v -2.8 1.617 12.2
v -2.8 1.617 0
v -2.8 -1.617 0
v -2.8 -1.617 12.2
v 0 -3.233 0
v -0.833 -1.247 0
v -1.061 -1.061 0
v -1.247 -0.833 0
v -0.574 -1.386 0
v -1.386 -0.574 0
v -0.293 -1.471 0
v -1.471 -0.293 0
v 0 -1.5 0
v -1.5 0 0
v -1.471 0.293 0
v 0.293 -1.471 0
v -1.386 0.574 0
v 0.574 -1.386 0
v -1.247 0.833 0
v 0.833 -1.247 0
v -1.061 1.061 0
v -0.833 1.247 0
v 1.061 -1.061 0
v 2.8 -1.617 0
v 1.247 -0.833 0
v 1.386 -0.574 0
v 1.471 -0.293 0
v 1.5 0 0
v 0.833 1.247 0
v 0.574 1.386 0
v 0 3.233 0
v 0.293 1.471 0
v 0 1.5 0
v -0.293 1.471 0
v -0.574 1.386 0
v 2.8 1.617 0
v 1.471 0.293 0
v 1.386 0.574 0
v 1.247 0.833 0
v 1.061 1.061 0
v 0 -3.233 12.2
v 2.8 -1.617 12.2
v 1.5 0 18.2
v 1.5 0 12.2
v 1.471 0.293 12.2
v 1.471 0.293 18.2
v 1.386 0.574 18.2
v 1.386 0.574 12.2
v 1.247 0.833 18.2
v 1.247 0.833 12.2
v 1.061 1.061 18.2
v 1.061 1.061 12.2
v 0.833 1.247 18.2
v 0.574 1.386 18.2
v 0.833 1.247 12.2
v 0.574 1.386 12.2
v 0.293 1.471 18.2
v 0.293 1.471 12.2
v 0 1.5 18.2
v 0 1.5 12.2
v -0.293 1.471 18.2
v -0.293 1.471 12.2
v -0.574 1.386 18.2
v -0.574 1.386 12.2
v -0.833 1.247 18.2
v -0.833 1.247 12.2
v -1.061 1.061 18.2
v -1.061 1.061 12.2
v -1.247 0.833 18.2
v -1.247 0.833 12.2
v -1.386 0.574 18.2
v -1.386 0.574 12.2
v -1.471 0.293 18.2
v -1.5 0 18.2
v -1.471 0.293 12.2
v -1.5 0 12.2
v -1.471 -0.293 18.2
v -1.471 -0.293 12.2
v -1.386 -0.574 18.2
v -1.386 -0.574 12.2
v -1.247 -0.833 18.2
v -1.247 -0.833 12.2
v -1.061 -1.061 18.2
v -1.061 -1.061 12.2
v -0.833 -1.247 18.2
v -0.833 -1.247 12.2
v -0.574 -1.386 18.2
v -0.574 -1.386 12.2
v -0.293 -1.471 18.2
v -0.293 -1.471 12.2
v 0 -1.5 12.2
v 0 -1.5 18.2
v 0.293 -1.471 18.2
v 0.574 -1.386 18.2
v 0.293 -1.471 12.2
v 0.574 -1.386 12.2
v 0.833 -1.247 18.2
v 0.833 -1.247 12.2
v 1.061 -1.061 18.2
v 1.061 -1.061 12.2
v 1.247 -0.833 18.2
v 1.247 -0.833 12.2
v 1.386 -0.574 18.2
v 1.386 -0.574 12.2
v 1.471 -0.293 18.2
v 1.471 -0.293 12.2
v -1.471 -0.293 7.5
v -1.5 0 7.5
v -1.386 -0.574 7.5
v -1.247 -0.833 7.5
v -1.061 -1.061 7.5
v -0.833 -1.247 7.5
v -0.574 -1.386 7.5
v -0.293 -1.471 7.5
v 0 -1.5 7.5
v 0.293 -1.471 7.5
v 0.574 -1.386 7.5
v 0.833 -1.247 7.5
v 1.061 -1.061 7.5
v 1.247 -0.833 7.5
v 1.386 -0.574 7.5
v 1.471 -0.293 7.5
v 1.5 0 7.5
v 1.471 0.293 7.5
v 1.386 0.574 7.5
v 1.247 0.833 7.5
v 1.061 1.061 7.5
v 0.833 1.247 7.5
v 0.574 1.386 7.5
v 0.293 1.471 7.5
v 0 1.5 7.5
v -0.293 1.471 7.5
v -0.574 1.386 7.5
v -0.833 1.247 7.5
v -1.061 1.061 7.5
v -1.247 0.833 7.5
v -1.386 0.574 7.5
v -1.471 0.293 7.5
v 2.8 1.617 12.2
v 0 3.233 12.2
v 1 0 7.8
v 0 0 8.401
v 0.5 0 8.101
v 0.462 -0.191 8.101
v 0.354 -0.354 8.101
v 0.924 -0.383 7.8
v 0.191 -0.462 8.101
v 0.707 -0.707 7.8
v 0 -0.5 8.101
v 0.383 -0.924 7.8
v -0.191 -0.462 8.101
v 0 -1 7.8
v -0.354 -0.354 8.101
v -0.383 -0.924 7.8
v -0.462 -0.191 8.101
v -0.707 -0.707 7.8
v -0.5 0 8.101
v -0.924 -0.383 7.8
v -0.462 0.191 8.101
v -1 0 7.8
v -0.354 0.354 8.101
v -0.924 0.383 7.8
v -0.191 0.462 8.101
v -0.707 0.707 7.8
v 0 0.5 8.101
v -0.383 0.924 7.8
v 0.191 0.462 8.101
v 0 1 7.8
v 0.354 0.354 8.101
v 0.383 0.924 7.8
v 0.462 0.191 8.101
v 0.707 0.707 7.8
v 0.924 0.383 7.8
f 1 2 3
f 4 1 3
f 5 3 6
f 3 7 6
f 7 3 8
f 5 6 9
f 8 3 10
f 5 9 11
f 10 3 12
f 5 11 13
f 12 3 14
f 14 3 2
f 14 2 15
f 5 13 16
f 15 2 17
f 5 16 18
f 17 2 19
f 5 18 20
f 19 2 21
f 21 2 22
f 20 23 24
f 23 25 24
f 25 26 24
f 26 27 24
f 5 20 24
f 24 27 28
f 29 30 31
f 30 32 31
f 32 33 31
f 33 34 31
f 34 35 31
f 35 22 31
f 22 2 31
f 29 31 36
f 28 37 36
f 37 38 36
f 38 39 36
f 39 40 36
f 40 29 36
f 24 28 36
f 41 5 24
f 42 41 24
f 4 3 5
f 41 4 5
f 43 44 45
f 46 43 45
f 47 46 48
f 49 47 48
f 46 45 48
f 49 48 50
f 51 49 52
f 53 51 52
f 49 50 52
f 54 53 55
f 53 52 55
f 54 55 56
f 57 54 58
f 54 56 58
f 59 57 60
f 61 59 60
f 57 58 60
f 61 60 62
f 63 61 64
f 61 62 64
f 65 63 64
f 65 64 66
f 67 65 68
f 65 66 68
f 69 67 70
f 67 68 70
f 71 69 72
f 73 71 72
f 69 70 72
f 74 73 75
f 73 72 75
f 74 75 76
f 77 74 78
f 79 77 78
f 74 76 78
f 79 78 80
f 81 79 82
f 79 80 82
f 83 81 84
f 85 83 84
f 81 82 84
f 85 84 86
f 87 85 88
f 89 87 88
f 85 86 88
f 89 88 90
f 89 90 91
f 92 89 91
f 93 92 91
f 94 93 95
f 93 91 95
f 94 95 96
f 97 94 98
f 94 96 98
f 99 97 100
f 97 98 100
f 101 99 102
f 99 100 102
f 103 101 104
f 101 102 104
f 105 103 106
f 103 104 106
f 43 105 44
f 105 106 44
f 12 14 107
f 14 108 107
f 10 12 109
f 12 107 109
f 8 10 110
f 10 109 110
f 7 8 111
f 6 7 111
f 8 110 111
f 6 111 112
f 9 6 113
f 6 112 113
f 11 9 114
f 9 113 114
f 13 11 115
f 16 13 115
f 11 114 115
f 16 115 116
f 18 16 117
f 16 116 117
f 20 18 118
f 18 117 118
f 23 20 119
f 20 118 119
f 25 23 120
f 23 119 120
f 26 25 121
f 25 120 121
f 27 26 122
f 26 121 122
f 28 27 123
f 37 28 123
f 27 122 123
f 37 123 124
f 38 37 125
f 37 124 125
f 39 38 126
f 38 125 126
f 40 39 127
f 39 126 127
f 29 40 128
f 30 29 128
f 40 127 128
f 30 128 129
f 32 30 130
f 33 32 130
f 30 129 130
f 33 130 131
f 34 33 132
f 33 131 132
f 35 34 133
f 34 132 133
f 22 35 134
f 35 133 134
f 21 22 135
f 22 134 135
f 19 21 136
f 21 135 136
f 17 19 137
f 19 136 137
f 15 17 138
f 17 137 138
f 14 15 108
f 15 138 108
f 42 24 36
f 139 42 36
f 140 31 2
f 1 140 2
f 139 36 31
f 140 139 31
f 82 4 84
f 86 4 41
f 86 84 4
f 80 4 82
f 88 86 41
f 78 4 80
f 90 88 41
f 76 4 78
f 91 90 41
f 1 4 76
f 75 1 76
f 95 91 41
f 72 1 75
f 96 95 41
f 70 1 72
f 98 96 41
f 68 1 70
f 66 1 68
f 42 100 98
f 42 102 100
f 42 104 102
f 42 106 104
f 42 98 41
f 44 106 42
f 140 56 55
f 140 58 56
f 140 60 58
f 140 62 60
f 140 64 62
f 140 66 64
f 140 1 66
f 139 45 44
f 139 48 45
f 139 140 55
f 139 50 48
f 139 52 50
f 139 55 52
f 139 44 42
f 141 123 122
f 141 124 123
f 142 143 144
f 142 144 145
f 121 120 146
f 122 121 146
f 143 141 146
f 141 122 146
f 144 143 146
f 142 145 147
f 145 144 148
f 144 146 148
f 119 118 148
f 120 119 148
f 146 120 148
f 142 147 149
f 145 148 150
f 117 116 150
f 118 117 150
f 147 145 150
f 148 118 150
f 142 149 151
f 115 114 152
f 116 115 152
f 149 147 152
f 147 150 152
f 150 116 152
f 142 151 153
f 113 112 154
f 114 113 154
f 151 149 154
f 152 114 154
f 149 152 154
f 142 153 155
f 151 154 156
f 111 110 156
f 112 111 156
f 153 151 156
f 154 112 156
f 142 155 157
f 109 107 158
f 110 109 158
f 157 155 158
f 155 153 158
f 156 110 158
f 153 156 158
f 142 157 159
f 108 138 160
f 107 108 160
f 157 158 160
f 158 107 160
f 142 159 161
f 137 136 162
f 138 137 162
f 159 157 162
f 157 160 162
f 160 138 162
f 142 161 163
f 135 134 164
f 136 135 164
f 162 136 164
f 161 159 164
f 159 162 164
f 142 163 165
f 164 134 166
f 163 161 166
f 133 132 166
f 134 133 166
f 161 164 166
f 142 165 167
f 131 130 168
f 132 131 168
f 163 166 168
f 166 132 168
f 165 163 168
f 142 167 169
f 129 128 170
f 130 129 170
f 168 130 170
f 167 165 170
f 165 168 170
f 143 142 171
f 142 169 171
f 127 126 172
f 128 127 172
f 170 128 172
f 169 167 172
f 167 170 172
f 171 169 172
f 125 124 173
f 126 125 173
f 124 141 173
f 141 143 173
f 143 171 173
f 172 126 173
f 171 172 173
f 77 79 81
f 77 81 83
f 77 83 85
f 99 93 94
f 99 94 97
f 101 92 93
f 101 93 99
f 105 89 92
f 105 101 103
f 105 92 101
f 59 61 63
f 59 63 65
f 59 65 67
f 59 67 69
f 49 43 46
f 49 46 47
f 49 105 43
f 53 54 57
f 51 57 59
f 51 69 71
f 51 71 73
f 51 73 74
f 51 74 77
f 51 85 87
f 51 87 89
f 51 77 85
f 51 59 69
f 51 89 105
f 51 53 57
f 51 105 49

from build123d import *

# Parameters (mm, degrees)
F1_DEPTH = 12.2
F2_D     = 3
F2_DEPTH = 7.5
F2_TIP   = 0.9012909285
F3_R     = 1.5
F4_DEPTH = 6


with BuildPart() as f1:
    # F0 (on Top) → F1 (new body)
    with BuildSketch(Plane.XY):
        Polygon((2.8, -1.6165807537), (2.8, 1.6165807537), (0, 3.2331615075), (-2.8, 1.6165807537), (-2.8, -1.6165807537), (0, -3.2331615075), align=None)
    extrude(amount=F1_DEPTH)

    # F2
    with Locations(Plane(origin=(0, 0, 0), x_dir=(1, 0, 0), z_dir=(0, 0, -1))):
        with Locations((0, 0)):
            Hole(F2_D / 2, depth=F2_DEPTH)
            with Locations((0, 0, -(F2_DEPTH + F2_TIP / 2))):  # 118° drill point
                Cone(0, F2_D / 2, F2_TIP, mode=Mode.SUBTRACT)

    # F3 (on face) → F4 (join)
    with BuildSketch(Plane.XY.offset(12.2)):
        Circle(F3_R)
    extrude(amount=F4_DEPTH)


solid = f1.part
